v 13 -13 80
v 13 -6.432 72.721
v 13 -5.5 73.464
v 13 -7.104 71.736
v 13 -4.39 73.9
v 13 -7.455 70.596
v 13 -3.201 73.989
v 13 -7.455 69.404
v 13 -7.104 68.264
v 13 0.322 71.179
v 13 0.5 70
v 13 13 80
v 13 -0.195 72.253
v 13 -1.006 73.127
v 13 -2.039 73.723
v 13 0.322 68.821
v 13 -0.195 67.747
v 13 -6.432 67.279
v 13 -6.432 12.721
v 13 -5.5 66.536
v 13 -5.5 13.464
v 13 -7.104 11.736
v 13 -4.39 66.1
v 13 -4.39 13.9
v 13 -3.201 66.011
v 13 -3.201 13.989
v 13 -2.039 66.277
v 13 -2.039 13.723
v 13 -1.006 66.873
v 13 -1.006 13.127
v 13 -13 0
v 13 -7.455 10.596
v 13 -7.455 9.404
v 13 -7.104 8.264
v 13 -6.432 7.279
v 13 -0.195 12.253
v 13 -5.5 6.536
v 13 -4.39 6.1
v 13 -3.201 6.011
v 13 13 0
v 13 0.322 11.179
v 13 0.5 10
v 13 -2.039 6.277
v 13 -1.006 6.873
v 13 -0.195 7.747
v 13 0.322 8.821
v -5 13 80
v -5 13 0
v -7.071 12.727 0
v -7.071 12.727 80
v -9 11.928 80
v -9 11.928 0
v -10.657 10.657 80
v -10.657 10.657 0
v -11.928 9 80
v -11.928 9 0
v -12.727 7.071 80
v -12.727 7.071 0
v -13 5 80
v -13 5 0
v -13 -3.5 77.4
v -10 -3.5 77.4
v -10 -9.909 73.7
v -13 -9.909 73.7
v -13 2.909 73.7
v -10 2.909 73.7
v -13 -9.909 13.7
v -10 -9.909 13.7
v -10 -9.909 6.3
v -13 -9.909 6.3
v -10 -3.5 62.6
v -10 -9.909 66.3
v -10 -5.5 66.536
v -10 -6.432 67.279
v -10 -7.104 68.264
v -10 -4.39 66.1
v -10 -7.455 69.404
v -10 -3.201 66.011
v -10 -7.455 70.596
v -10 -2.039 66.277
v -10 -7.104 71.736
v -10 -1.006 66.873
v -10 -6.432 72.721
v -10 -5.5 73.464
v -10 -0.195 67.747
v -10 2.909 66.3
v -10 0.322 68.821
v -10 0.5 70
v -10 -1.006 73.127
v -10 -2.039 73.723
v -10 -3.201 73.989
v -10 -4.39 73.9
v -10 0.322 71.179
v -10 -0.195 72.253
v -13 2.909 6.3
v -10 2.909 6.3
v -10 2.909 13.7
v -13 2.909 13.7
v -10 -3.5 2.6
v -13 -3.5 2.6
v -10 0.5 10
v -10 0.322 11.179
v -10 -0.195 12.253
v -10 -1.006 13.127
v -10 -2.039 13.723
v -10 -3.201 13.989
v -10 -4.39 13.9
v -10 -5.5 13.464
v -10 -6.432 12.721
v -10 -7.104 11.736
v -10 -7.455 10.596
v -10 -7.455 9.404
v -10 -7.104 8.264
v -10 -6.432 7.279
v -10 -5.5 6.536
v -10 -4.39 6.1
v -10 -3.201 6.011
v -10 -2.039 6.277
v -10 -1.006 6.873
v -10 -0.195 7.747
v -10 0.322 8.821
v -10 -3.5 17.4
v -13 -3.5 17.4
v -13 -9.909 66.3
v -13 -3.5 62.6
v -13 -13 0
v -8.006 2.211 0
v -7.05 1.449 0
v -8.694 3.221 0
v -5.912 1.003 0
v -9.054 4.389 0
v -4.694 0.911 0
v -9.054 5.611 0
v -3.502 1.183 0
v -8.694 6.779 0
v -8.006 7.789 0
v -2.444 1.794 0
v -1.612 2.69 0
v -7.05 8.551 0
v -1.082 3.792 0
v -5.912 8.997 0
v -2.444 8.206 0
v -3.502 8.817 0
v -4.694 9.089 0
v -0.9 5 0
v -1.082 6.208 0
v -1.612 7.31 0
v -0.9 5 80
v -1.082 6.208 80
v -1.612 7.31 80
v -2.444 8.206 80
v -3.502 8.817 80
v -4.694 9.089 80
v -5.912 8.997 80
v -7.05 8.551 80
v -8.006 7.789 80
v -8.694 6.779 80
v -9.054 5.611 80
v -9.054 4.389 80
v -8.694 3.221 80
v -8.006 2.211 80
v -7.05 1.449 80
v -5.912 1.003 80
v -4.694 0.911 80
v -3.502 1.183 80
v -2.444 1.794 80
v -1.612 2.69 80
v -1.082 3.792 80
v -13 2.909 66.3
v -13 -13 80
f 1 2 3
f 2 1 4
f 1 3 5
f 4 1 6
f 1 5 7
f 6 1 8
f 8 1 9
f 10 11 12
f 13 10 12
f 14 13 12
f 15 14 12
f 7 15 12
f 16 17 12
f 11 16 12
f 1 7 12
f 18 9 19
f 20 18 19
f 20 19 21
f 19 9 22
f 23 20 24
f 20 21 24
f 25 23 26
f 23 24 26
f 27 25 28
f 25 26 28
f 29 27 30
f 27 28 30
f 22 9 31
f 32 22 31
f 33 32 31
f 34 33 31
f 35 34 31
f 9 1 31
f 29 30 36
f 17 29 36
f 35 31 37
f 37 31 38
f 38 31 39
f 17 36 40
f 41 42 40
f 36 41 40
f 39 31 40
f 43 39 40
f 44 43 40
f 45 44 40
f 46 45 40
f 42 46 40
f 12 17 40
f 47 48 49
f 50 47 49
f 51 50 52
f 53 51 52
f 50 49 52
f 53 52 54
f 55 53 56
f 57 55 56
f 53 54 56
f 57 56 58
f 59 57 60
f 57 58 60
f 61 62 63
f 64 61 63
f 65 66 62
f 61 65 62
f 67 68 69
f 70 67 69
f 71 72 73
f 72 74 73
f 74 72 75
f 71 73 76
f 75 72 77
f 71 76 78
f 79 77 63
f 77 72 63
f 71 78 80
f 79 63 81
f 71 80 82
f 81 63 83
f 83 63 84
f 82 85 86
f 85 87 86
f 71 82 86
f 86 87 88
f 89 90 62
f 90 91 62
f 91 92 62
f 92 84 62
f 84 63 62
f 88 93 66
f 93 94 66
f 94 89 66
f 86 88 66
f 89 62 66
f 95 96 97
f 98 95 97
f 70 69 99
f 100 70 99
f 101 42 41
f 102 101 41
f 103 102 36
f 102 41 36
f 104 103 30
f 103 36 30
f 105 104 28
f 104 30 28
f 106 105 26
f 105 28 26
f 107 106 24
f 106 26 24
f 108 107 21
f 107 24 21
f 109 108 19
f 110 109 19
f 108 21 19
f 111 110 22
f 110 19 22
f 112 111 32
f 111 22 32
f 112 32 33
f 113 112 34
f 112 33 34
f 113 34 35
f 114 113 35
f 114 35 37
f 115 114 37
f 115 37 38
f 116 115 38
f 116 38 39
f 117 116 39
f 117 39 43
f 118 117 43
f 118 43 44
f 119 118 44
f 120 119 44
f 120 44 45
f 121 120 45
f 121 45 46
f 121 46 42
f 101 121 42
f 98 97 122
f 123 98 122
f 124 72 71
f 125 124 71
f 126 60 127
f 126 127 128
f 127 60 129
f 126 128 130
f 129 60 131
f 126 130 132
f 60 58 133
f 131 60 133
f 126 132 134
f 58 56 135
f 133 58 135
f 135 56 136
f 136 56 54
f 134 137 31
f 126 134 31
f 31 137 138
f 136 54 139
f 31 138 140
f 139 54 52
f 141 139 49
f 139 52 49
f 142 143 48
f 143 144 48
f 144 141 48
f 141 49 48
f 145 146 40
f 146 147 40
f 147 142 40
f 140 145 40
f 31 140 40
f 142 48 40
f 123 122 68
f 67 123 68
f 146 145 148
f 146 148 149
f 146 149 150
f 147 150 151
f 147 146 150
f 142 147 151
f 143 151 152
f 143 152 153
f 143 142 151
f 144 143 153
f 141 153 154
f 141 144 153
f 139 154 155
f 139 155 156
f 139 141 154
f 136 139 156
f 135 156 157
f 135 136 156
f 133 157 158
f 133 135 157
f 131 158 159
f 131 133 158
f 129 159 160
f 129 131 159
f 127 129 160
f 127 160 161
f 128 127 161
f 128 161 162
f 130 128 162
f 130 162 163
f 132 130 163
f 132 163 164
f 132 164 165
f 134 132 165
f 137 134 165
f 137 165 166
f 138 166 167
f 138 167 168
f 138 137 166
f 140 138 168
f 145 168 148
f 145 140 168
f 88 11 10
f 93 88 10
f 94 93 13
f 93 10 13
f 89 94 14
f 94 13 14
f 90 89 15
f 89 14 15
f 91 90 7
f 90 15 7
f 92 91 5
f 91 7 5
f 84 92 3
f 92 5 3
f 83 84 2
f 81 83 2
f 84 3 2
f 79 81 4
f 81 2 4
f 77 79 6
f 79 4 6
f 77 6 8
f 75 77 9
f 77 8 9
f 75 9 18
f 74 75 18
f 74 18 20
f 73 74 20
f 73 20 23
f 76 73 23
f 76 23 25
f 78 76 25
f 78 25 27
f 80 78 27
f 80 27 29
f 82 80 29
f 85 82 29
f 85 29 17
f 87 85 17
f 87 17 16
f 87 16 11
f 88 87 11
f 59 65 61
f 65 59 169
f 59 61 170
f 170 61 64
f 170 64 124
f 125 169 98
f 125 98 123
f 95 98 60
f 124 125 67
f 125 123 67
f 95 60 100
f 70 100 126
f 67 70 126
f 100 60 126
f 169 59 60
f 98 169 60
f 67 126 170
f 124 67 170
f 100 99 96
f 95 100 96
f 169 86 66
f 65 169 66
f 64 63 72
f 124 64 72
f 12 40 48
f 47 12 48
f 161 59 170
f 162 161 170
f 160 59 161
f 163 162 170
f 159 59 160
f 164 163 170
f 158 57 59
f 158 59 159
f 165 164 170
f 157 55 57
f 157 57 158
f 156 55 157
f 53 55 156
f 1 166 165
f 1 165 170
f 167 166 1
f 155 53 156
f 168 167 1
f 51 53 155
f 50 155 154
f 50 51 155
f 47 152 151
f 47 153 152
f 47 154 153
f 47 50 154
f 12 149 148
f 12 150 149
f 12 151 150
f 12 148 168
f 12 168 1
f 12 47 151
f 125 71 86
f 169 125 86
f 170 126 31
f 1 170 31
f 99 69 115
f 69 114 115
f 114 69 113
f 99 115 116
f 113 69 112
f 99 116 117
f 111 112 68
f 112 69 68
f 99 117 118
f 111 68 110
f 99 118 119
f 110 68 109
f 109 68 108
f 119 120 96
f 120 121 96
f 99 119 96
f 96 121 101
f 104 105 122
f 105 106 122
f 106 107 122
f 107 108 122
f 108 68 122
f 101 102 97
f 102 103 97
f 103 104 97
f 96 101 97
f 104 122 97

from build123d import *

# Parameters (mm, degrees)
SKETCH001_R  = 4
PAD004_DEPTH = 31
PAD006_DEPTH = 4
SKETCH_R     = 4.1
PAD_DEPTH    = 80


with BuildPart() as rodhole02:
    # Sketch001 → Pad004 (new body)
    with BuildSketch(Plane.YZ.offset(15.5)):
        with Locations((-3.5, 70)):
            Circle(SKETCH001_R)
        with Locations((-3.5, 10)):
            Circle(SKETCH001_R)
    extrude(amount=-PAD004_DEPTH)


with BuildPart() as cutblock:
    # Sketch002 → Pad006 (new body)
    with BuildSketch(Plane.YZ.offset(-10)):
        Polygon((2.908588, 66.3), (2.908588, 73.7), (-3.5, 77.4), (-9.908588, 73.7), (-9.908588, 66.3), (-3.5, 62.6), align=None)
        Polygon((-3.5, 2.6), (2.908588, 6.3), (2.908588, 13.7), (-3.5, 17.4), (-9.908588, 13.7), (-9.908588, 6.3), align=None)
    extrude(amount=-PAD006_DEPTH)

    # Fusion: union RodHole02
    add(rodhole02.part)


with BuildPart() as cut:
    # Sketch → Pad (new body)
    with BuildSketch(Plane.XY):
        with BuildLine():
            Line((-13.000011, 5.000021), (-13.000011, -13))
            Line((-13.000011, -13), (13.000011, -13))
            Line((13.000011, -13), (13.000011, 13))
            Line((13.000011, 13), (-5.00001, 13))
            ThreePointArc((-5.00001, 13), (-10.656858, 10.656862), (-13.000011, 5.000021))
        make_face()
        with Locations((-5.000011, 5)):
            Circle(SKETCH_R, mode=Mode.SUBTRACT)
    extrude(amount=PAD_DEPTH)

    # Cut: cut CutBlock
    add(cutblock.part, mode=Mode.SUBTRACT)


solid = cut.part
